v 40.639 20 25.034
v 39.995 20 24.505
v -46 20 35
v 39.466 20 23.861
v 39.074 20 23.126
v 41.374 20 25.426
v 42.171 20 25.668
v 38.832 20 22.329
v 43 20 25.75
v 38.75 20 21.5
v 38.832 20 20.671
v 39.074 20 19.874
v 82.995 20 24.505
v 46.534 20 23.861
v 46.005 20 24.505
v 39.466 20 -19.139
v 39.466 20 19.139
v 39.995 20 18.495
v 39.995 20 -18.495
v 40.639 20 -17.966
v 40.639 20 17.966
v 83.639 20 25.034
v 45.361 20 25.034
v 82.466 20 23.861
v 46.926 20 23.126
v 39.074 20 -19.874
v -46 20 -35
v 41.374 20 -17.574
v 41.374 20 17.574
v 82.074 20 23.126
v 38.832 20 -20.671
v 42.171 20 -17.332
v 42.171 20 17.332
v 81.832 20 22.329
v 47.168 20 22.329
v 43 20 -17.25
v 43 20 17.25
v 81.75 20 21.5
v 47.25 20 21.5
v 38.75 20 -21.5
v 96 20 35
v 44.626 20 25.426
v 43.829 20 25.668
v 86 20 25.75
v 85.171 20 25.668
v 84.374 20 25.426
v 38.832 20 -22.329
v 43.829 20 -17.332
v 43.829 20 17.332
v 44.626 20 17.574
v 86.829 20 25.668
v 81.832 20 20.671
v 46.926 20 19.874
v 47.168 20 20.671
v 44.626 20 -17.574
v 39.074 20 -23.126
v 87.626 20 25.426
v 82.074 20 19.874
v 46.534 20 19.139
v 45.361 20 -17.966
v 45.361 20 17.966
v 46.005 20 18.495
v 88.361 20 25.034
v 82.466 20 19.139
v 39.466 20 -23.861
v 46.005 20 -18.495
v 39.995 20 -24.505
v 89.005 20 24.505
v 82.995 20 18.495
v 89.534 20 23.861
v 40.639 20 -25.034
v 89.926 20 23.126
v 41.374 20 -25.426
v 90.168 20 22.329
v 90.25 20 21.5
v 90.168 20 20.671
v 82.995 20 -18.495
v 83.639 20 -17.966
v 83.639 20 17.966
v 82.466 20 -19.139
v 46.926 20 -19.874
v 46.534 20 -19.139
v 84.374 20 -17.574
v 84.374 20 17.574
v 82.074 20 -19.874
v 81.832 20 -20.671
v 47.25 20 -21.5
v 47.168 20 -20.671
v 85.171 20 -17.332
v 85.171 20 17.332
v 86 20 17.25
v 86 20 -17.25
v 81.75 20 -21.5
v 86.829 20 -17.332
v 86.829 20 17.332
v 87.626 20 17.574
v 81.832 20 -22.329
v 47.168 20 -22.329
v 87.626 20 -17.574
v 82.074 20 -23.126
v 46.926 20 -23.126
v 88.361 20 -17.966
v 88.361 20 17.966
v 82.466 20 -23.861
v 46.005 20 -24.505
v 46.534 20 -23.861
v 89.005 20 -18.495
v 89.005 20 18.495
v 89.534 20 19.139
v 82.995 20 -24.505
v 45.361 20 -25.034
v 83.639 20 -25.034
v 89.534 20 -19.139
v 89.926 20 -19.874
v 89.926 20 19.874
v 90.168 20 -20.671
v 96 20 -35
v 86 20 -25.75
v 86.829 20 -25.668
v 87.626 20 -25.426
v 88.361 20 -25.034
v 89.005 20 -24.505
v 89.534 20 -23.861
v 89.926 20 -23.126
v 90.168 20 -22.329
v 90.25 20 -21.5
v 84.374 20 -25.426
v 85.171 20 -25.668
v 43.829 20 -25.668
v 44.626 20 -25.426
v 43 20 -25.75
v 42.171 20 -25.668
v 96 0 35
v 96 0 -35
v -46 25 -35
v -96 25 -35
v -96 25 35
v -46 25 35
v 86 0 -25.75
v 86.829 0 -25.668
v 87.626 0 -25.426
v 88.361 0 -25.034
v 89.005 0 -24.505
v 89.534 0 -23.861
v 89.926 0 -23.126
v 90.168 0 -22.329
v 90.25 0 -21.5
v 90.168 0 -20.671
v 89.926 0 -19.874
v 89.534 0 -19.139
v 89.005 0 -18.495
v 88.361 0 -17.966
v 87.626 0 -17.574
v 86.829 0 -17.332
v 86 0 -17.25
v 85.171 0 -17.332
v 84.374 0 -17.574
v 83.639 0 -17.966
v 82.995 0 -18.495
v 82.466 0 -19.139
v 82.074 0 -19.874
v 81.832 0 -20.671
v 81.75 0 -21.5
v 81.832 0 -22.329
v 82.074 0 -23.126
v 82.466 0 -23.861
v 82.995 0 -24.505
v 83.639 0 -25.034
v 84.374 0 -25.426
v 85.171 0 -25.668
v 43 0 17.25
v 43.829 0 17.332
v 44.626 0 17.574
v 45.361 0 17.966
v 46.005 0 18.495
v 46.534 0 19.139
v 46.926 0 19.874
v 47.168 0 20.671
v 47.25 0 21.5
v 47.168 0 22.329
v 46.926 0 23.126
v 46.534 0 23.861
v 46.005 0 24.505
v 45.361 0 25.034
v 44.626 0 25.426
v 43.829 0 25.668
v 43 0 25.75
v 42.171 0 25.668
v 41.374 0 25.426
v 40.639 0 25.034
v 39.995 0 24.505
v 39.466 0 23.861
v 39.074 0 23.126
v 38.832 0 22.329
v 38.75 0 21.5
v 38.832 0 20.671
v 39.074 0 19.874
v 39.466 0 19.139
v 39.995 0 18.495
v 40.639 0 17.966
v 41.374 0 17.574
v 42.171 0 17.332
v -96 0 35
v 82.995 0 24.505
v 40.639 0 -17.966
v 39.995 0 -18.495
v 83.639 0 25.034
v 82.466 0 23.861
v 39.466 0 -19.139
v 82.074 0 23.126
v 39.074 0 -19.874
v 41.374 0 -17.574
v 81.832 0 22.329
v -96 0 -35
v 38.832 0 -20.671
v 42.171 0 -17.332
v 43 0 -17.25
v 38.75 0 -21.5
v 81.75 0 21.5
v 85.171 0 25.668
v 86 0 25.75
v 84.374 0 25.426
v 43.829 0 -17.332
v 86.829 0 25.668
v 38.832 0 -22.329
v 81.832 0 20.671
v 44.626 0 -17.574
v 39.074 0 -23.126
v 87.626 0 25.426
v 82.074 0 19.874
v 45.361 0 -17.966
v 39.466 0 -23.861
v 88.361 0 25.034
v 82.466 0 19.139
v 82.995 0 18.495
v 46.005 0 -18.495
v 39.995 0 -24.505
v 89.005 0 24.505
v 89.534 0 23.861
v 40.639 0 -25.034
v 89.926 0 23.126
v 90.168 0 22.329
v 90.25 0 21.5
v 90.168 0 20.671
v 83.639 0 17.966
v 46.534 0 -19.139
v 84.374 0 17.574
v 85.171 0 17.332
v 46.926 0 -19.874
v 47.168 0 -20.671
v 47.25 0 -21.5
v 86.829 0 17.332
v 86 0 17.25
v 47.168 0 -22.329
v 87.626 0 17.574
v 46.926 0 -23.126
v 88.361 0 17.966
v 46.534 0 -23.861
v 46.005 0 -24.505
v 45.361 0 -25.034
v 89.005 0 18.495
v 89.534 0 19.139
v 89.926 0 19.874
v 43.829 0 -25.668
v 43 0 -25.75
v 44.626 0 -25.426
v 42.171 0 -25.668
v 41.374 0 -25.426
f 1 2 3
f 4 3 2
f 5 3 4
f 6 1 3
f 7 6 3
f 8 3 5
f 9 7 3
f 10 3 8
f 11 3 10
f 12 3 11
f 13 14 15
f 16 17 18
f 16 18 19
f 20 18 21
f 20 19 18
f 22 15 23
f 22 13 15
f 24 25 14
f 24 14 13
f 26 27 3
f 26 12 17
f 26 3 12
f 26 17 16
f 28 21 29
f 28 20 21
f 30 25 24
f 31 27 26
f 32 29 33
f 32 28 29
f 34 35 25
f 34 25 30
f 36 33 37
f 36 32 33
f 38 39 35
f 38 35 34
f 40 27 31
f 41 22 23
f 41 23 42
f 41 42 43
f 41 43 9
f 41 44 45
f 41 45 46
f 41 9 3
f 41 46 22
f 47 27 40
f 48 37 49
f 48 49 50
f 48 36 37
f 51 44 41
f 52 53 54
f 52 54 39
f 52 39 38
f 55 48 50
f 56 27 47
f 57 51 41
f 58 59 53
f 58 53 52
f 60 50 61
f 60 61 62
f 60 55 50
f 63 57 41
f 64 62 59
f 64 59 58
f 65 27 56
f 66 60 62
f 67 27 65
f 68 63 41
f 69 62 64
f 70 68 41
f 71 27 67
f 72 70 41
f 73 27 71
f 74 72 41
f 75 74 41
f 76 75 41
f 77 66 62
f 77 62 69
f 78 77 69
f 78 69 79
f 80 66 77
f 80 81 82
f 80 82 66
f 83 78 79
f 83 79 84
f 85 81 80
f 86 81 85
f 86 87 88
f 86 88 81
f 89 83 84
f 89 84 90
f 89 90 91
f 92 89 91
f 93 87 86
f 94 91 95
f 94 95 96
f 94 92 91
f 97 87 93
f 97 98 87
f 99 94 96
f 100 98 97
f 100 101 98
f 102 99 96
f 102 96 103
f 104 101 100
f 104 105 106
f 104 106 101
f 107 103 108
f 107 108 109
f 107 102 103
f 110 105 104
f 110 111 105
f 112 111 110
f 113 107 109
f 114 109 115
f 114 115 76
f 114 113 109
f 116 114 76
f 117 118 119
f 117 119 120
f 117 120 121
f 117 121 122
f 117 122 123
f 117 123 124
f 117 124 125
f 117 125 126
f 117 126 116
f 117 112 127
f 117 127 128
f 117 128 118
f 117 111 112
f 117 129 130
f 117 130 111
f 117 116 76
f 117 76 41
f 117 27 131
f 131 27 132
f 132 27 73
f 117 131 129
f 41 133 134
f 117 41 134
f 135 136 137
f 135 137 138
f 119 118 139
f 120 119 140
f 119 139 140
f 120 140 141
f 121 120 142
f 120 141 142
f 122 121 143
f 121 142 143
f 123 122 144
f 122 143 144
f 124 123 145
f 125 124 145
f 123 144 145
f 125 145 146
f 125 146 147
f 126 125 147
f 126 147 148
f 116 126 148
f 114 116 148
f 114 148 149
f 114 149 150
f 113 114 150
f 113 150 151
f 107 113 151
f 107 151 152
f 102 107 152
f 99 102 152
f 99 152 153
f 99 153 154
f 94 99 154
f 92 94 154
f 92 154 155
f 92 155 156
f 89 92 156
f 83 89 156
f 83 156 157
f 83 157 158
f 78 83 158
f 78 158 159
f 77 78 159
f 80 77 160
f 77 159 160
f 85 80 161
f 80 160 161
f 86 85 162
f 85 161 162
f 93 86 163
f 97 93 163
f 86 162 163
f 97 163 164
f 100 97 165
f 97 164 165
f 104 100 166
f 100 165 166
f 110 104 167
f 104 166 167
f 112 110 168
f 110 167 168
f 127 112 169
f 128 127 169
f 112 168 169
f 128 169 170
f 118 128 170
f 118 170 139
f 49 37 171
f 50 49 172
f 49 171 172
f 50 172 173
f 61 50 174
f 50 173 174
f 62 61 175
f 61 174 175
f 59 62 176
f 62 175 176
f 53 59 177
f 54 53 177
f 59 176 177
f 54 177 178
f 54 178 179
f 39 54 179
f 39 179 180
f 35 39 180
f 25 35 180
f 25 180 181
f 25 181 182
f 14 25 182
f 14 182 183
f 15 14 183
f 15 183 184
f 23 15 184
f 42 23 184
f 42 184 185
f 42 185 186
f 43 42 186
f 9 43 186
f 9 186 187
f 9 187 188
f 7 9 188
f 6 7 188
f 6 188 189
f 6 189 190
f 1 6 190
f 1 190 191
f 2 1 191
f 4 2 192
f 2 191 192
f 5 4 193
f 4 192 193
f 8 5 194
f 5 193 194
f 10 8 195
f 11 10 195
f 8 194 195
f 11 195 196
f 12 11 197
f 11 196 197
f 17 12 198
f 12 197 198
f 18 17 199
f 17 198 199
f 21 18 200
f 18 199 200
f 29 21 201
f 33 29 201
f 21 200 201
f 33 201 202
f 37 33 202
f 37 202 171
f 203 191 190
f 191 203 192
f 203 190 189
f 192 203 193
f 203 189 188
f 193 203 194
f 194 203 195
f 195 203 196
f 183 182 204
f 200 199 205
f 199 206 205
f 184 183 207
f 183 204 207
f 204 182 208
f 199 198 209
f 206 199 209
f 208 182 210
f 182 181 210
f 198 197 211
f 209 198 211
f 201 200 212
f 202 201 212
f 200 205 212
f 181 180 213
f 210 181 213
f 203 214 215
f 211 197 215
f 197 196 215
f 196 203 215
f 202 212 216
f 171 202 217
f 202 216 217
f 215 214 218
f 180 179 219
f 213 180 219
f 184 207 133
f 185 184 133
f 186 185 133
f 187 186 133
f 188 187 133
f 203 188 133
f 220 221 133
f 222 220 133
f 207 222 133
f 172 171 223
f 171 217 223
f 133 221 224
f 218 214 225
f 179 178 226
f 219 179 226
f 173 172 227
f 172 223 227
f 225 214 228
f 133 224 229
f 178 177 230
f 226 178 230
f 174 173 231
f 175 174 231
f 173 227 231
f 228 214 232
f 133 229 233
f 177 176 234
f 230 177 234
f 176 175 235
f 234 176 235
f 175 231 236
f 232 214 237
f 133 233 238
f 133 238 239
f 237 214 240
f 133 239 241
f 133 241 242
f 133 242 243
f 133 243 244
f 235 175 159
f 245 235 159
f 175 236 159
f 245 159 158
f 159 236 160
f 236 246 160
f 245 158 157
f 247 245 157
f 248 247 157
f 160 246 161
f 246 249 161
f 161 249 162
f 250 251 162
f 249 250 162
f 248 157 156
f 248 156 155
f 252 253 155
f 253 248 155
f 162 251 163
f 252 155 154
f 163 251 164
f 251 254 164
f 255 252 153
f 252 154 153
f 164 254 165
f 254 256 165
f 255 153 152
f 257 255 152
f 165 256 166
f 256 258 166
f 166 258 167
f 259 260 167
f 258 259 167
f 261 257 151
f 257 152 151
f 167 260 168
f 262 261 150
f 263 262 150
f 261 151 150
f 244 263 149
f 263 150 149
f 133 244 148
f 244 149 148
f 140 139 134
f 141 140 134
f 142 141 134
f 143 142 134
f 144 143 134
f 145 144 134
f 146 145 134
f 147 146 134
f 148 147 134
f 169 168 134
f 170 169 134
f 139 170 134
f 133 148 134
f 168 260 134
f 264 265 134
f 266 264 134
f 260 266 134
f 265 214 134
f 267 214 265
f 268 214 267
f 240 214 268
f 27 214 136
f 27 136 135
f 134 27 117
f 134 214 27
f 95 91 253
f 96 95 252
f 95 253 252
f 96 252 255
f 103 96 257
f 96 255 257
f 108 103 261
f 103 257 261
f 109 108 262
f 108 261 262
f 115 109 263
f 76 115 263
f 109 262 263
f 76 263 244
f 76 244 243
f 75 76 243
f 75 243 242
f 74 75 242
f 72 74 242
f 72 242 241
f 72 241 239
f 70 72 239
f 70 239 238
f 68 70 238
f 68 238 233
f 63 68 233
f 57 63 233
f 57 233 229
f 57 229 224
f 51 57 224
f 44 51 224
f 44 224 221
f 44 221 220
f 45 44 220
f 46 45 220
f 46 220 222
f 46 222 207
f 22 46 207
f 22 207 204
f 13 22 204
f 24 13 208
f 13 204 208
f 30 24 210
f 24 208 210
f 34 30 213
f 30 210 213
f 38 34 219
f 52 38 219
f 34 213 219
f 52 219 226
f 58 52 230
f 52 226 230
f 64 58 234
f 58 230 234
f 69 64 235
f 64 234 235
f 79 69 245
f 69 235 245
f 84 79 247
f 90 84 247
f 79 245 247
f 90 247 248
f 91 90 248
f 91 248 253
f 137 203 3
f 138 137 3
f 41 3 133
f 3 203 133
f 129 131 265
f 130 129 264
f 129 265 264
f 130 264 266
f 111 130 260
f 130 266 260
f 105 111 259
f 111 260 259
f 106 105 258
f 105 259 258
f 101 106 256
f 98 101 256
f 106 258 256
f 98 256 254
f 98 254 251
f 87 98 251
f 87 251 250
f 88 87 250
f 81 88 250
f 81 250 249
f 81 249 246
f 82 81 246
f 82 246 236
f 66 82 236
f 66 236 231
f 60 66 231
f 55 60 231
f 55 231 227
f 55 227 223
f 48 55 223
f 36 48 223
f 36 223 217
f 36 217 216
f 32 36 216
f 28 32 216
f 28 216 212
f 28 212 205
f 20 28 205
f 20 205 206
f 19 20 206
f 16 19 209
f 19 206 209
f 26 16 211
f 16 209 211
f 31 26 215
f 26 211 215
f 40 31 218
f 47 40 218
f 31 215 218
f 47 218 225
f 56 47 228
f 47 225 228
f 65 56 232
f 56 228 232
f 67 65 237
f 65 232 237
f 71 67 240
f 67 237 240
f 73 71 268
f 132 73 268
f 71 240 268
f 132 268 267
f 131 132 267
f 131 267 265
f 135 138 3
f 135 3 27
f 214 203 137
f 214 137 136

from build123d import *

# Parameters (mm, degrees)
SKETCH_1_W                  = 192
SKETCH_1_H                  = 70
EXTRUDE_1_DEPTH             = 25
CUT_EXTRUDE_1_REACH         = 107.195
SKETCH_2_R                  = 4.25
PATTERN_LINEAR_1_COUNT      = 2
PATTERN_LINEAR_1_PITCH      = 43
PATTERN_LINEAR_1_COUNT_DIR2 = 2
PATTERN_LINEAR_1_PITCH_DIR2 = 43
SKETCH_3_W                  = 142
SKETCH_3_H                  = 70
CUT_EXTRUDE_2_DEPTH         = 5


with BuildPart() as part:
    # 草图1 → 凸台-拉伸1 (new body)
    with BuildSketch(Plane(origin=(0, 0, 0), x_dir=(1, 0, 0), z_dir=(0, 1, 0))):
        Rectangle(SKETCH_1_W, SKETCH_1_H)
    extrude(amount=EXTRUDE_1_DEPTH)

    # 草图2 → 切除-拉伸1 (cut, up to next)
    with BuildSketch(Plane.XZ, mode=Mode.PRIVATE) as cut_extrude_1_sk1:
        with Locations(Location((86, 21.5, 0), (0, 0, 270))):
            Circle(SKETCH_2_R)
    cut_extrude_1_tool1 = extrude(cut_extrude_1_sk1.sketch, amount=-CUT_EXTRUDE_1_REACH, mode=Mode.PRIVATE) & part.part
    cut_extrude_1 = cut_extrude_1_tool1.solids().sort_by_distance((86, 0, 21.5))[0]
    add(cut_extrude_1, mode=Mode.SUBTRACT)

    # 阵列(线性)1: Cut-Extrude 1 2 × 2
    with Locations(*[(-i * PATTERN_LINEAR_1_PITCH, 0, -j * PATTERN_LINEAR_1_PITCH_DIR2) for i in range(PATTERN_LINEAR_1_COUNT) for j in range(PATTERN_LINEAR_1_COUNT_DIR2) if (i, j) != (0, 0)]):
        add(cut_extrude_1, mode=Mode.SUBTRACT)

    # 草图3 → 切除-拉伸2 (cut)
    with BuildSketch(Plane(origin=(0, 25, 0), x_dir=(1, 0, 0), z_dir=(0, 1, 0))):
        with Locations((25, 0)):
            Rectangle(SKETCH_3_W, SKETCH_3_H)
    extrude(amount=-CUT_EXTRUDE_2_DEPTH, mode=Mode.SUBTRACT)


solid = part.part
